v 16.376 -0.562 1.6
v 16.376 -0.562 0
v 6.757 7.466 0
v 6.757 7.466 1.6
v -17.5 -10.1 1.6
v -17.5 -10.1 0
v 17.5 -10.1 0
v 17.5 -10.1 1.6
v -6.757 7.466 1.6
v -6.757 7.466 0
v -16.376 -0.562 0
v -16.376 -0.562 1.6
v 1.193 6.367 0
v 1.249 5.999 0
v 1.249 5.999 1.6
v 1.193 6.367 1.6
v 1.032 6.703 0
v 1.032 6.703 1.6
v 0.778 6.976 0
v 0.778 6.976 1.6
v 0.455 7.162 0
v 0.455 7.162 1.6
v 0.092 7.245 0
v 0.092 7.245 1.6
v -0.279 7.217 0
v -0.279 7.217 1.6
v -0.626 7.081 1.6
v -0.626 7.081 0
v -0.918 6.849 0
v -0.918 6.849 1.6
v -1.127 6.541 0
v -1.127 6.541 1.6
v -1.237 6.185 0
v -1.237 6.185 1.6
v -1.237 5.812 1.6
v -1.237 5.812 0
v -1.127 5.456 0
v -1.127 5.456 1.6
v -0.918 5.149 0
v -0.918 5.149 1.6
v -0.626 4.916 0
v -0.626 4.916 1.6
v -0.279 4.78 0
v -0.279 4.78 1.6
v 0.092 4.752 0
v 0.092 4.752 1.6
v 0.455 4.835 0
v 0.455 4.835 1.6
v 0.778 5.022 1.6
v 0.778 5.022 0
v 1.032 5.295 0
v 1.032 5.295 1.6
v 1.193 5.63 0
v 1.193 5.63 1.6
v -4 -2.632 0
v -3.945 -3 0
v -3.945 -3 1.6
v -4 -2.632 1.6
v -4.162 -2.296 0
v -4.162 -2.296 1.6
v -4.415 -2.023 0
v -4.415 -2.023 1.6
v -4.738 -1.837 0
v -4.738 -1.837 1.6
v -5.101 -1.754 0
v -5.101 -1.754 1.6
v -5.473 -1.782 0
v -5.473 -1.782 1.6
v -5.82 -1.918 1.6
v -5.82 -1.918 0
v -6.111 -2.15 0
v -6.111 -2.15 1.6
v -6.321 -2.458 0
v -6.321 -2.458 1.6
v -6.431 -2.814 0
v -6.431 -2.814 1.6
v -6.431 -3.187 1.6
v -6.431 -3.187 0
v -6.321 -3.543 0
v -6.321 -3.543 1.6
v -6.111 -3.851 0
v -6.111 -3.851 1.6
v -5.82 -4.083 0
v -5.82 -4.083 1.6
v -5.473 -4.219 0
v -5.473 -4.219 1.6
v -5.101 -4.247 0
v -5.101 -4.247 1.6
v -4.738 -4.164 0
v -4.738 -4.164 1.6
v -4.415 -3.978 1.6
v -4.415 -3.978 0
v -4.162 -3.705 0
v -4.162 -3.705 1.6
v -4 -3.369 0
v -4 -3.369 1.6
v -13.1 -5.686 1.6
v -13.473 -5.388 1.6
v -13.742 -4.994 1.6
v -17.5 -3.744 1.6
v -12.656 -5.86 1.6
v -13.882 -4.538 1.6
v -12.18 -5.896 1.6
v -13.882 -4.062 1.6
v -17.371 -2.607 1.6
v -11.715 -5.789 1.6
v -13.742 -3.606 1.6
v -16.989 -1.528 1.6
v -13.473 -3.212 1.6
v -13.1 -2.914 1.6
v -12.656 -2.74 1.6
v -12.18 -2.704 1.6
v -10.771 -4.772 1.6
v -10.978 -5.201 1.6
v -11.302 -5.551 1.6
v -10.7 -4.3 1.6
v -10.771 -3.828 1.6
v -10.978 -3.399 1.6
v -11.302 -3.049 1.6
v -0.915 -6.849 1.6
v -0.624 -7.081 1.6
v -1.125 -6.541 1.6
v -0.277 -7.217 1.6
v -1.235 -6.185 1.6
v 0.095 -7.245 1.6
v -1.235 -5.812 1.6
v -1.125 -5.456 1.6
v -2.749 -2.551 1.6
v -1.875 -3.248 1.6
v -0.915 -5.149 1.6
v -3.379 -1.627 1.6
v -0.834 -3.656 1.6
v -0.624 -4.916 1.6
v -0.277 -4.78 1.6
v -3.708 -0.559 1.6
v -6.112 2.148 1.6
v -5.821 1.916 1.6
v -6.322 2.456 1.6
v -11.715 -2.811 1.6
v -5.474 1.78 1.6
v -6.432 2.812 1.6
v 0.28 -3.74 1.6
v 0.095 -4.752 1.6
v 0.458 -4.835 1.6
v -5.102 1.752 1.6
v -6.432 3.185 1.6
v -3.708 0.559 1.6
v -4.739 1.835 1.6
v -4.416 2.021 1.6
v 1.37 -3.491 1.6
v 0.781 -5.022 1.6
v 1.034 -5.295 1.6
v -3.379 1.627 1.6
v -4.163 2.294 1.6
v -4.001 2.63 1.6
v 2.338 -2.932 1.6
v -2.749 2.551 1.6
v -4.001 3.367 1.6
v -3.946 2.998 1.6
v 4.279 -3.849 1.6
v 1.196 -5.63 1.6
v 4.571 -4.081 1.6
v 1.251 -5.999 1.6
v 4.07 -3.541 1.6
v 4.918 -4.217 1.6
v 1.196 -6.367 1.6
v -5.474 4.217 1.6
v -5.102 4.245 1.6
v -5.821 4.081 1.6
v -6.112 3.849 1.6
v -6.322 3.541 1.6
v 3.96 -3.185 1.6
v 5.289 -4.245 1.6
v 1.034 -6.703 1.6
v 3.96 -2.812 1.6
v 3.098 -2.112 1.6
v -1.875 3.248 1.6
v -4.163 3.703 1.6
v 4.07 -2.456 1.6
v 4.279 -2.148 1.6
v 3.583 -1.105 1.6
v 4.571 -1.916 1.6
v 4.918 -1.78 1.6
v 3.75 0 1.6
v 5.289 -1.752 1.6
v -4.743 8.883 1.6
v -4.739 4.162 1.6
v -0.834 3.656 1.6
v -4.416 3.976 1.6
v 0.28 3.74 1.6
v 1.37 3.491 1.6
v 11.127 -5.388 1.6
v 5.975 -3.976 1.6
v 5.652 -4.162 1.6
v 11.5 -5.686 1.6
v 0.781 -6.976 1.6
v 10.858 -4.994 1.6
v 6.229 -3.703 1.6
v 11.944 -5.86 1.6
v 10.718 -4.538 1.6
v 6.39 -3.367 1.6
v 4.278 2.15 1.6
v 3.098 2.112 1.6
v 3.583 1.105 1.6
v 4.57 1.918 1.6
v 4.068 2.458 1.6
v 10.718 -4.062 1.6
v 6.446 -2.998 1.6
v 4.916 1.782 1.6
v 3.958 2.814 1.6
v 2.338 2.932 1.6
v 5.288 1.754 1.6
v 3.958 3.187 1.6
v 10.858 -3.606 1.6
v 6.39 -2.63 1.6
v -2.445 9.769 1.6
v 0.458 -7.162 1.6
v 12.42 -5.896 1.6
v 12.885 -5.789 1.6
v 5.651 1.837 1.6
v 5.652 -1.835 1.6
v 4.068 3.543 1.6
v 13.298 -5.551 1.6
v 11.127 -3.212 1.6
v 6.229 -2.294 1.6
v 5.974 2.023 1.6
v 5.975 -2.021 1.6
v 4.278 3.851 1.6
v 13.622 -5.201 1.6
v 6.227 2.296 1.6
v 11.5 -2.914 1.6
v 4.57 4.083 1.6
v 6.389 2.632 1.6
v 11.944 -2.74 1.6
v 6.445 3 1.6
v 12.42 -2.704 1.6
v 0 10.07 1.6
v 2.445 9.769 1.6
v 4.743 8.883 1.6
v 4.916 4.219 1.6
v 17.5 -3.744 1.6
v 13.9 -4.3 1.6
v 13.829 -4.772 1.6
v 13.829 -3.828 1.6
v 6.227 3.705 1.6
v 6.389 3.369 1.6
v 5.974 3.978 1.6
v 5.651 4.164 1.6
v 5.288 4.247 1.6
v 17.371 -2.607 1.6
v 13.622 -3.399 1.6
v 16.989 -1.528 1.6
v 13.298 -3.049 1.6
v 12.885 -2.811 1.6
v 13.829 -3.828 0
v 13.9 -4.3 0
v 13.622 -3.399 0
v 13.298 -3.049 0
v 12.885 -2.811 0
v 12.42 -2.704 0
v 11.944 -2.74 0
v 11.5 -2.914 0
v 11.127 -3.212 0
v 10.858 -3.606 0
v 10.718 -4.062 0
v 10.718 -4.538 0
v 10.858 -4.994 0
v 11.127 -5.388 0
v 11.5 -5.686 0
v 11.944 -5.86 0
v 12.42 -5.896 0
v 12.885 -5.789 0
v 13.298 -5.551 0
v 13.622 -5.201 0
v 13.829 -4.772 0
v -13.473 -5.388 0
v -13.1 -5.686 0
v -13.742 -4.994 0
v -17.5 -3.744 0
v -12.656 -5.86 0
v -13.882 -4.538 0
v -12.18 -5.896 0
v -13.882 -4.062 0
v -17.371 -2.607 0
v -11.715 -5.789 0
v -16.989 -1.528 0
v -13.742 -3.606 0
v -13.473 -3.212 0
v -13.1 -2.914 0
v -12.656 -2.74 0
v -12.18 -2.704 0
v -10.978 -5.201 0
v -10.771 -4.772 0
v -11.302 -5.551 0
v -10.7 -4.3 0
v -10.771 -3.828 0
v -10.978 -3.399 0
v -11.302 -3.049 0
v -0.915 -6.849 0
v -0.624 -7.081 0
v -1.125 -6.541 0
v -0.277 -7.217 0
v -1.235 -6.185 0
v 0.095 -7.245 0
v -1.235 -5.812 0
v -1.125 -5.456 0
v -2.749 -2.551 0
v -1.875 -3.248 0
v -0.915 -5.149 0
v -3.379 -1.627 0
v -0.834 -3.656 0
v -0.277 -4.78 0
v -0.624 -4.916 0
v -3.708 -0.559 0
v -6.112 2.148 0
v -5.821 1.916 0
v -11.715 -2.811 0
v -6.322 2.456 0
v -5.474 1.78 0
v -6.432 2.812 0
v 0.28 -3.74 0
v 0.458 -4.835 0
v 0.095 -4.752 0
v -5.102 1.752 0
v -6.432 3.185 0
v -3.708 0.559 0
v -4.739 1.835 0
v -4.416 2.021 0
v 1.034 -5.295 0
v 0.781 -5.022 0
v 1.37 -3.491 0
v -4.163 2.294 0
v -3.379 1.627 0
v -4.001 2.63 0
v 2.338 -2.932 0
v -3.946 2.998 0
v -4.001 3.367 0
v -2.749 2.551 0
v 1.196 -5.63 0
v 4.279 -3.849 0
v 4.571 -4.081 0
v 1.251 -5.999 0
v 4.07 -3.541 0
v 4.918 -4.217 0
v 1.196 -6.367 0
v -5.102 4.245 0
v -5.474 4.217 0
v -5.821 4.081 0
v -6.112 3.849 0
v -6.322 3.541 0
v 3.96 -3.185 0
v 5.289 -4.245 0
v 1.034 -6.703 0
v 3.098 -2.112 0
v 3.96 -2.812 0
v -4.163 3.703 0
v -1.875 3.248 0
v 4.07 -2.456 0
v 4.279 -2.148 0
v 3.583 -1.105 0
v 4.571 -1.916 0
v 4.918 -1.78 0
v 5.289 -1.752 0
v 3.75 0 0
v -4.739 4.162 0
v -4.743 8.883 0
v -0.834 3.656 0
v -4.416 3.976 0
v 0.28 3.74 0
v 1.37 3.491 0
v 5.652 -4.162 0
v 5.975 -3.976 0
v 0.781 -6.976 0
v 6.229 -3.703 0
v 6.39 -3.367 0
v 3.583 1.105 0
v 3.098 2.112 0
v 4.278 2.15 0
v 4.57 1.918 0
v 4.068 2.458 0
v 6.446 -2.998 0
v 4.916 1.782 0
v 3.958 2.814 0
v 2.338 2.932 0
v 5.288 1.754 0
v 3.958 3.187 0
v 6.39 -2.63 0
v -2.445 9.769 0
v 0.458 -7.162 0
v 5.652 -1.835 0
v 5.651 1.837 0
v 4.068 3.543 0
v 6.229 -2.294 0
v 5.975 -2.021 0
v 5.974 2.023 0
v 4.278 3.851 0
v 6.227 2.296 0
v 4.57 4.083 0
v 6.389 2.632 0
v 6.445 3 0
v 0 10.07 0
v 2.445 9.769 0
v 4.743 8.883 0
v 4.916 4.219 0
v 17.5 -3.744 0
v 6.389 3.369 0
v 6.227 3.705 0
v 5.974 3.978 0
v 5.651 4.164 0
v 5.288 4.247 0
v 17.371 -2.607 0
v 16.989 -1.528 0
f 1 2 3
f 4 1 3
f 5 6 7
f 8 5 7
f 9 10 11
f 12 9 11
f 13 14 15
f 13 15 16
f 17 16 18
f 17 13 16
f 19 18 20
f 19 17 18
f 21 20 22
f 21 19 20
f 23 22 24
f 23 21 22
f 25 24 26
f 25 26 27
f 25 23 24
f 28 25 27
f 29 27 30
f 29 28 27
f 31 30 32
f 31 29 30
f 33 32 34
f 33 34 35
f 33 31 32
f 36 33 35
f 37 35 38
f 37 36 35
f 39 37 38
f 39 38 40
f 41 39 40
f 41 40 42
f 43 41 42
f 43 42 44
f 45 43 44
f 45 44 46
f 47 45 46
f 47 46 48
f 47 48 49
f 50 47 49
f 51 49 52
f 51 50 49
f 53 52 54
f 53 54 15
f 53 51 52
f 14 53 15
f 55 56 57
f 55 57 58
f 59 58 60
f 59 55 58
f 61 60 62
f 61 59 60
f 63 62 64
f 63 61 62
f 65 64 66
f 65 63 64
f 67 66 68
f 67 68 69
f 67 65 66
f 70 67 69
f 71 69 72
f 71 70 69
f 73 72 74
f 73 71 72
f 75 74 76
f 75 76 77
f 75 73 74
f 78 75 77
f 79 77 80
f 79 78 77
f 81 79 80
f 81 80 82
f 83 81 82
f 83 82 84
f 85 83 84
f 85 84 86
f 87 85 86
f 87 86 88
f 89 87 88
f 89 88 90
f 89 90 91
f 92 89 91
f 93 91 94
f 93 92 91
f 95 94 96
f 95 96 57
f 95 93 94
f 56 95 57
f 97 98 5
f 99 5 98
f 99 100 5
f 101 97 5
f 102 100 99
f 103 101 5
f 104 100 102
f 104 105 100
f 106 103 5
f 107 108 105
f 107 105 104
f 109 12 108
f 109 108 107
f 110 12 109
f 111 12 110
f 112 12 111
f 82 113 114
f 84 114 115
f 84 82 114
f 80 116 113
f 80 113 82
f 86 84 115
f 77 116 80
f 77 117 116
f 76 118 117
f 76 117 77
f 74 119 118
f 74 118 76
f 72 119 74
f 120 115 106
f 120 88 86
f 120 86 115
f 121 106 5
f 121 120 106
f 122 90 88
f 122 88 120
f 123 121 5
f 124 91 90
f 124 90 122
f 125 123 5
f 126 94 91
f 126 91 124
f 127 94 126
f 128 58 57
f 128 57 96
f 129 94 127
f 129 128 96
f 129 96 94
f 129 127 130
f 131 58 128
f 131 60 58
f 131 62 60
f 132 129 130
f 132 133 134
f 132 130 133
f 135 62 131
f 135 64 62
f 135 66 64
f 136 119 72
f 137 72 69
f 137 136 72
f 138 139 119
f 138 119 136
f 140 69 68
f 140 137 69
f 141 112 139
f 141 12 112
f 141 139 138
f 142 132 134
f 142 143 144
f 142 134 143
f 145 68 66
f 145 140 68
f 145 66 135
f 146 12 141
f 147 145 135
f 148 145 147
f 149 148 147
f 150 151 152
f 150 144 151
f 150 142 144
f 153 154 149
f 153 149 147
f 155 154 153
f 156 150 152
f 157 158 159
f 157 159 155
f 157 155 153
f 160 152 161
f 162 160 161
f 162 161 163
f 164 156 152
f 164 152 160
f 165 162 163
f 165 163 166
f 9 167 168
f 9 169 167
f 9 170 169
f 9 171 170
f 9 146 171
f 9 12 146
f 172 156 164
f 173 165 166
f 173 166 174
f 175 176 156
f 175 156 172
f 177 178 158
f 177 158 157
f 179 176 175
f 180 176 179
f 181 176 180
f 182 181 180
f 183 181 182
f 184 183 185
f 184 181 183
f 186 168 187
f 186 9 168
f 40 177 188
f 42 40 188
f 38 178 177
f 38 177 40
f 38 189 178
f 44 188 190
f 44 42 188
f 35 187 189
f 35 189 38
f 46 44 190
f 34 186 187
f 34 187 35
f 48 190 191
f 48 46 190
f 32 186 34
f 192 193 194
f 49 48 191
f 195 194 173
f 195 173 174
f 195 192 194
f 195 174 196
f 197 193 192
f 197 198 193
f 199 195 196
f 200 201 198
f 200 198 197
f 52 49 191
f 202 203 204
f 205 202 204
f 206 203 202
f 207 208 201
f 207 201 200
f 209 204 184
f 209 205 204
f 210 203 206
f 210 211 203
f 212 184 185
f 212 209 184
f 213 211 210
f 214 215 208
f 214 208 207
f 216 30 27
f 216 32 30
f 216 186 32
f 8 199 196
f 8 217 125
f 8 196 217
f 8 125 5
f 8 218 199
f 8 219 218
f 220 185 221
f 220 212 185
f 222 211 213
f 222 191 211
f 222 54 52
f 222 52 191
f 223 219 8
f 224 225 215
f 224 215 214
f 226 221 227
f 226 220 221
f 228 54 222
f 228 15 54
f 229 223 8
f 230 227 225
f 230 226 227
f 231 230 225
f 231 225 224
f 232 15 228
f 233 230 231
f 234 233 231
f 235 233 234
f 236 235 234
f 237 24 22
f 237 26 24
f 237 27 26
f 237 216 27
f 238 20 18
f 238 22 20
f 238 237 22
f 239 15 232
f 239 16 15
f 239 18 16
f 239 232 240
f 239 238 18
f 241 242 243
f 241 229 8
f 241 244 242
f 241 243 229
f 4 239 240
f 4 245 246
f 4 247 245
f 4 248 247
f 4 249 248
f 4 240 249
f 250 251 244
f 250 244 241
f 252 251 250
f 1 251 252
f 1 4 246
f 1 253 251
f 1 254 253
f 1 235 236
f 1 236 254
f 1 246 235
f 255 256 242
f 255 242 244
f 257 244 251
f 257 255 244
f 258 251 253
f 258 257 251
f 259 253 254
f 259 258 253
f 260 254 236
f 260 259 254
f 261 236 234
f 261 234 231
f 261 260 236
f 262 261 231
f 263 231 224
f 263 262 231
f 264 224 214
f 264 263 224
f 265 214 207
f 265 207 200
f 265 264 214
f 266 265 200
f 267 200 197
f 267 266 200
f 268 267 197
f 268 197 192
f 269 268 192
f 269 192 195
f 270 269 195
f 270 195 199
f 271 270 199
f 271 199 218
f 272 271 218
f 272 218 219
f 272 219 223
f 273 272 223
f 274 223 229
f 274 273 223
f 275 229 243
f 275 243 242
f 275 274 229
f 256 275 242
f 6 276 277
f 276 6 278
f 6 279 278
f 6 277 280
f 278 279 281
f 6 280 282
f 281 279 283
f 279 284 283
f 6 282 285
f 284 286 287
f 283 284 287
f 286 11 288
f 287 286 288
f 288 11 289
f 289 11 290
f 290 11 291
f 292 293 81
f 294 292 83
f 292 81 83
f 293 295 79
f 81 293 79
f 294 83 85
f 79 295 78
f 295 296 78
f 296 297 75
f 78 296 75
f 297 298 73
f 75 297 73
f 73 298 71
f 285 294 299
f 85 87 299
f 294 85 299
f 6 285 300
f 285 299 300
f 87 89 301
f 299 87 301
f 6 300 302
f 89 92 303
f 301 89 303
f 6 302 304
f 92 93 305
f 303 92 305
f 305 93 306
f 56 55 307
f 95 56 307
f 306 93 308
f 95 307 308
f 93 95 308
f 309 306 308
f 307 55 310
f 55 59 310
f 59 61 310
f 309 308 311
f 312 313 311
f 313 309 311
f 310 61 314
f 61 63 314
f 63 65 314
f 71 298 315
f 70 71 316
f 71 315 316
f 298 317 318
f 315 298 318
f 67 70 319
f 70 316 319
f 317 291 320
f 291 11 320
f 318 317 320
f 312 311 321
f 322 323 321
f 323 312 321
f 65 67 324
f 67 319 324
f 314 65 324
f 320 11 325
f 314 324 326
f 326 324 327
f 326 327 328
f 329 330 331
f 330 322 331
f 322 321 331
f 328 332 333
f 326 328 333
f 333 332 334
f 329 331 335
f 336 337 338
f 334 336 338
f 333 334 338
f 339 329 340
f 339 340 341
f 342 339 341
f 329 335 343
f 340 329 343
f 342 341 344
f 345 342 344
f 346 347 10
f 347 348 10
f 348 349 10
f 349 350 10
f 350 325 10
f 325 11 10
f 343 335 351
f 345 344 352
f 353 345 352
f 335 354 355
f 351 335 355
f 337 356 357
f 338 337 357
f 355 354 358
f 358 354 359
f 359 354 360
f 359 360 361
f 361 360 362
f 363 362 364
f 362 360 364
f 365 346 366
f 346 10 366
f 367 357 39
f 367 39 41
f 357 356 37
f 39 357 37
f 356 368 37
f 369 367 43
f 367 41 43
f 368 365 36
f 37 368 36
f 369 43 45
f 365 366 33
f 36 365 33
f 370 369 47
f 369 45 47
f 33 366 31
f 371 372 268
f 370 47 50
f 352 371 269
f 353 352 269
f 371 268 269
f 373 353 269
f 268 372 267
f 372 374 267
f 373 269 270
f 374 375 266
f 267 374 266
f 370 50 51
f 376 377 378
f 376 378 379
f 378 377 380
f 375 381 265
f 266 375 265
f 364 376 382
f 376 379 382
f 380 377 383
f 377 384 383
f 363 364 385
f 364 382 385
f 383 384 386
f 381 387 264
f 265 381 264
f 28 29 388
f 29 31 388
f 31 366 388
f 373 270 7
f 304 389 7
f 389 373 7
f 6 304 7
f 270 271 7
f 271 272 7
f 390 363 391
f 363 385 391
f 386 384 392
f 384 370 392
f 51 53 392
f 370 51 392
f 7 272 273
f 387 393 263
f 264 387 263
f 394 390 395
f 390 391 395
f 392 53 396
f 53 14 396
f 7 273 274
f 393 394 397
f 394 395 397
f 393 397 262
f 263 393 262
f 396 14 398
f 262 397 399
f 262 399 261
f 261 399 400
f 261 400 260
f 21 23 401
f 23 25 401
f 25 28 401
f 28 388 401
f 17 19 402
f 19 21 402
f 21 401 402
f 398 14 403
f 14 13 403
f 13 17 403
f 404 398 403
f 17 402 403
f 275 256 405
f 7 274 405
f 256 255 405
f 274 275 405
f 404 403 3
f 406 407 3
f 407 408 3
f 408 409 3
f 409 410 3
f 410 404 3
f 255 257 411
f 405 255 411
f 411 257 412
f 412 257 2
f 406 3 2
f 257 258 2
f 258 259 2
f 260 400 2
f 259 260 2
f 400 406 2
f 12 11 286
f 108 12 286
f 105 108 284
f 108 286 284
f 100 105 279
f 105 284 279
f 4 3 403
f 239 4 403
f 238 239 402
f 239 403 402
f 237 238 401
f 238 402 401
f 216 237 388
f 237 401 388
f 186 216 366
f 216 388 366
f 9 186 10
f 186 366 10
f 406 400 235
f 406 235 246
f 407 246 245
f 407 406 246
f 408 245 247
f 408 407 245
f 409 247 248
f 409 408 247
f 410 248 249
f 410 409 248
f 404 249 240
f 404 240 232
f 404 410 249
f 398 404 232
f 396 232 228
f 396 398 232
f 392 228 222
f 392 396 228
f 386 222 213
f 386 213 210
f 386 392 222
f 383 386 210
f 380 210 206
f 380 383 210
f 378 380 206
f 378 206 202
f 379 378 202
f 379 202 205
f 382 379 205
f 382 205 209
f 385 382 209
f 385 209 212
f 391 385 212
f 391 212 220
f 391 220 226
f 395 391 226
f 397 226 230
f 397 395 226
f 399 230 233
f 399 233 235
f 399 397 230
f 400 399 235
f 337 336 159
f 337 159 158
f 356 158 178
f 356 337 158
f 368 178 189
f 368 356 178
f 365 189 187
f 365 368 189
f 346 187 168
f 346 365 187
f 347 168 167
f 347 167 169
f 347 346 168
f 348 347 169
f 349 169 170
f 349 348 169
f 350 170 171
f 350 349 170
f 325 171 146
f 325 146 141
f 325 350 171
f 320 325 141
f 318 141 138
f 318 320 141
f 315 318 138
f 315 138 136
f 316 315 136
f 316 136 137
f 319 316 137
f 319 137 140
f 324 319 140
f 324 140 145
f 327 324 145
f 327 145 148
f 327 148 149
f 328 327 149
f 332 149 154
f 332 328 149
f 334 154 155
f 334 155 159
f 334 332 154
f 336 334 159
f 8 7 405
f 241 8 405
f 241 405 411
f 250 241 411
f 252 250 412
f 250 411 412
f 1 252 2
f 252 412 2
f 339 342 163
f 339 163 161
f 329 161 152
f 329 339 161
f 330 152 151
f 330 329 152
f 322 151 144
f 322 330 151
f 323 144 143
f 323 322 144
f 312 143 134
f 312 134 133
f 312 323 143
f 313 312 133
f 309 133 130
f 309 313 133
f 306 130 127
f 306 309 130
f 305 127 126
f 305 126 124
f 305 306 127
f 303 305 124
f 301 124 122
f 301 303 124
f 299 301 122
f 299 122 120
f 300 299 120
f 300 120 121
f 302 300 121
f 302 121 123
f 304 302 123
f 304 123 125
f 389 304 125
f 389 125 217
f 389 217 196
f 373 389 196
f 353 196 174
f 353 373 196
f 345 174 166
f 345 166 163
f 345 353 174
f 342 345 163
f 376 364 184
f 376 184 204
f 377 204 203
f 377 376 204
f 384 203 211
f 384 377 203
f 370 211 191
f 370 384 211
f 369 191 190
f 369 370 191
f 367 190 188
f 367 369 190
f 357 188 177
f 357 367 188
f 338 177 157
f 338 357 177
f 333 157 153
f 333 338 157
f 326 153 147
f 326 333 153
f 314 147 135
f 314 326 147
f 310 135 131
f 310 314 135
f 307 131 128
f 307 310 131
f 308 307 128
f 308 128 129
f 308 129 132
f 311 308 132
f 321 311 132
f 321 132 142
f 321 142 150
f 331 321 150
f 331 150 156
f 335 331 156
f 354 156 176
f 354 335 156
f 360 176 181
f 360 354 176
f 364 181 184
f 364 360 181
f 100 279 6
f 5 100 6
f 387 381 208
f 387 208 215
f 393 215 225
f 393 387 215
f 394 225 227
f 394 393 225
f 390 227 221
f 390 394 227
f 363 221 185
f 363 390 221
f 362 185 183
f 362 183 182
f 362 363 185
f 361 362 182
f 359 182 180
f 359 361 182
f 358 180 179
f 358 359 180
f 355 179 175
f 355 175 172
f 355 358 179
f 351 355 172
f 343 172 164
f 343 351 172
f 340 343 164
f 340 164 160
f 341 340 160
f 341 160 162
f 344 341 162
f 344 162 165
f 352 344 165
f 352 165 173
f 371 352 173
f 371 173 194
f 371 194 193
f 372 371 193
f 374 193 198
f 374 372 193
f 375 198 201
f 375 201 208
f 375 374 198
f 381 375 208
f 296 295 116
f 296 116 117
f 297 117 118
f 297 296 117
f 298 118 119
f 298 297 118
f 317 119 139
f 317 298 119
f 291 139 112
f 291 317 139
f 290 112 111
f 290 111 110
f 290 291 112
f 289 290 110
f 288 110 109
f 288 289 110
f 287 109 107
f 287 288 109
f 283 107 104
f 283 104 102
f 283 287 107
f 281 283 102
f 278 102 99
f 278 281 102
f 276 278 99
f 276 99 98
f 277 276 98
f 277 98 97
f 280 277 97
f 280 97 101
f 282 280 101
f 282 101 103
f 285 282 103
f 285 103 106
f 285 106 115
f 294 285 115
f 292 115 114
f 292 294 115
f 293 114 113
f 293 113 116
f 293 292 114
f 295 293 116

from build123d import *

# Parameters (mm, degrees)
CROQUIS1_R              = 3.75
CROQUIS1_R_2            = 1.249999997
CROQUIS1_R_3            = 1.25
CROQUIS1_R_4            = 1.250000007
CROQUIS1_R_5            = 1.6
SALIENTE_EXTRUIR1_DEPTH = 1.6


with BuildPart() as part:
    # Croquis1 → Saliente-Extruir1 (new body)
    with BuildSketch(Plane.XY):
        with BuildLine():
            Line((-17.5, -10.1), (17.5, -10.1))
            Line((17.5, -10.1), (17.5, -3.744033218))
            ThreePointArc((17.5, -3.744033218), (17.210606187, -2.056801008), (16.375506293, -0.562441789))
            Line((16.375506293, -0.562441789), (6.757496482, 7.466348016))
            ThreePointArc((6.757496482, 7.466348016), (0, 10.070258755), (-6.757496482, 7.466348016))
            Line((-6.757496482, 7.466348016), (-16.375506293, -0.562441789))
            ThreePointArc((-16.375506293, -0.562441789), (-17.210606187, -2.056801008), (-17.5, -3.744033218))
            Line((-17.5, -3.744033218), (-17.5, -10.1))
        make_face()
        Circle(CROQUIS1_R, mode=Mode.SUBTRACT)
        with Locations((-0.0012, 5.99880001)):
            Circle(CROQUIS1_R_2, mode=Mode.SUBTRACT)
        with Locations((5.194513192, 3.000439231)):
            Circle(CROQUIS1_R_3, mode=Mode.SUBTRACT)
        with Locations((5.195713192, -2.998360769)):
            Circle(CROQUIS1_R_3, mode=Mode.SUBTRACT)
        with Locations((0.0012, -5.9988)):
            Circle(CROQUIS1_R_3, mode=Mode.SUBTRACT)
        with Locations((-5.194513192, -3.00043923)):
            Circle(CROQUIS1_R_3, mode=Mode.SUBTRACT)
        with Locations((-5.195713248, 2.998360802)):
            Circle(CROQUIS1_R_4, mode=Mode.SUBTRACT)
        with Locations((12.3, -4.3)):
            Circle(CROQUIS1_R_5, mode=Mode.SUBTRACT)
        with Locations((-12.3, -4.3)):
            Circle(CROQUIS1_R_5, mode=Mode.SUBTRACT)
    extrude(amount=SALIENTE_EXTRUIR1_DEPTH)


solid = part.part
